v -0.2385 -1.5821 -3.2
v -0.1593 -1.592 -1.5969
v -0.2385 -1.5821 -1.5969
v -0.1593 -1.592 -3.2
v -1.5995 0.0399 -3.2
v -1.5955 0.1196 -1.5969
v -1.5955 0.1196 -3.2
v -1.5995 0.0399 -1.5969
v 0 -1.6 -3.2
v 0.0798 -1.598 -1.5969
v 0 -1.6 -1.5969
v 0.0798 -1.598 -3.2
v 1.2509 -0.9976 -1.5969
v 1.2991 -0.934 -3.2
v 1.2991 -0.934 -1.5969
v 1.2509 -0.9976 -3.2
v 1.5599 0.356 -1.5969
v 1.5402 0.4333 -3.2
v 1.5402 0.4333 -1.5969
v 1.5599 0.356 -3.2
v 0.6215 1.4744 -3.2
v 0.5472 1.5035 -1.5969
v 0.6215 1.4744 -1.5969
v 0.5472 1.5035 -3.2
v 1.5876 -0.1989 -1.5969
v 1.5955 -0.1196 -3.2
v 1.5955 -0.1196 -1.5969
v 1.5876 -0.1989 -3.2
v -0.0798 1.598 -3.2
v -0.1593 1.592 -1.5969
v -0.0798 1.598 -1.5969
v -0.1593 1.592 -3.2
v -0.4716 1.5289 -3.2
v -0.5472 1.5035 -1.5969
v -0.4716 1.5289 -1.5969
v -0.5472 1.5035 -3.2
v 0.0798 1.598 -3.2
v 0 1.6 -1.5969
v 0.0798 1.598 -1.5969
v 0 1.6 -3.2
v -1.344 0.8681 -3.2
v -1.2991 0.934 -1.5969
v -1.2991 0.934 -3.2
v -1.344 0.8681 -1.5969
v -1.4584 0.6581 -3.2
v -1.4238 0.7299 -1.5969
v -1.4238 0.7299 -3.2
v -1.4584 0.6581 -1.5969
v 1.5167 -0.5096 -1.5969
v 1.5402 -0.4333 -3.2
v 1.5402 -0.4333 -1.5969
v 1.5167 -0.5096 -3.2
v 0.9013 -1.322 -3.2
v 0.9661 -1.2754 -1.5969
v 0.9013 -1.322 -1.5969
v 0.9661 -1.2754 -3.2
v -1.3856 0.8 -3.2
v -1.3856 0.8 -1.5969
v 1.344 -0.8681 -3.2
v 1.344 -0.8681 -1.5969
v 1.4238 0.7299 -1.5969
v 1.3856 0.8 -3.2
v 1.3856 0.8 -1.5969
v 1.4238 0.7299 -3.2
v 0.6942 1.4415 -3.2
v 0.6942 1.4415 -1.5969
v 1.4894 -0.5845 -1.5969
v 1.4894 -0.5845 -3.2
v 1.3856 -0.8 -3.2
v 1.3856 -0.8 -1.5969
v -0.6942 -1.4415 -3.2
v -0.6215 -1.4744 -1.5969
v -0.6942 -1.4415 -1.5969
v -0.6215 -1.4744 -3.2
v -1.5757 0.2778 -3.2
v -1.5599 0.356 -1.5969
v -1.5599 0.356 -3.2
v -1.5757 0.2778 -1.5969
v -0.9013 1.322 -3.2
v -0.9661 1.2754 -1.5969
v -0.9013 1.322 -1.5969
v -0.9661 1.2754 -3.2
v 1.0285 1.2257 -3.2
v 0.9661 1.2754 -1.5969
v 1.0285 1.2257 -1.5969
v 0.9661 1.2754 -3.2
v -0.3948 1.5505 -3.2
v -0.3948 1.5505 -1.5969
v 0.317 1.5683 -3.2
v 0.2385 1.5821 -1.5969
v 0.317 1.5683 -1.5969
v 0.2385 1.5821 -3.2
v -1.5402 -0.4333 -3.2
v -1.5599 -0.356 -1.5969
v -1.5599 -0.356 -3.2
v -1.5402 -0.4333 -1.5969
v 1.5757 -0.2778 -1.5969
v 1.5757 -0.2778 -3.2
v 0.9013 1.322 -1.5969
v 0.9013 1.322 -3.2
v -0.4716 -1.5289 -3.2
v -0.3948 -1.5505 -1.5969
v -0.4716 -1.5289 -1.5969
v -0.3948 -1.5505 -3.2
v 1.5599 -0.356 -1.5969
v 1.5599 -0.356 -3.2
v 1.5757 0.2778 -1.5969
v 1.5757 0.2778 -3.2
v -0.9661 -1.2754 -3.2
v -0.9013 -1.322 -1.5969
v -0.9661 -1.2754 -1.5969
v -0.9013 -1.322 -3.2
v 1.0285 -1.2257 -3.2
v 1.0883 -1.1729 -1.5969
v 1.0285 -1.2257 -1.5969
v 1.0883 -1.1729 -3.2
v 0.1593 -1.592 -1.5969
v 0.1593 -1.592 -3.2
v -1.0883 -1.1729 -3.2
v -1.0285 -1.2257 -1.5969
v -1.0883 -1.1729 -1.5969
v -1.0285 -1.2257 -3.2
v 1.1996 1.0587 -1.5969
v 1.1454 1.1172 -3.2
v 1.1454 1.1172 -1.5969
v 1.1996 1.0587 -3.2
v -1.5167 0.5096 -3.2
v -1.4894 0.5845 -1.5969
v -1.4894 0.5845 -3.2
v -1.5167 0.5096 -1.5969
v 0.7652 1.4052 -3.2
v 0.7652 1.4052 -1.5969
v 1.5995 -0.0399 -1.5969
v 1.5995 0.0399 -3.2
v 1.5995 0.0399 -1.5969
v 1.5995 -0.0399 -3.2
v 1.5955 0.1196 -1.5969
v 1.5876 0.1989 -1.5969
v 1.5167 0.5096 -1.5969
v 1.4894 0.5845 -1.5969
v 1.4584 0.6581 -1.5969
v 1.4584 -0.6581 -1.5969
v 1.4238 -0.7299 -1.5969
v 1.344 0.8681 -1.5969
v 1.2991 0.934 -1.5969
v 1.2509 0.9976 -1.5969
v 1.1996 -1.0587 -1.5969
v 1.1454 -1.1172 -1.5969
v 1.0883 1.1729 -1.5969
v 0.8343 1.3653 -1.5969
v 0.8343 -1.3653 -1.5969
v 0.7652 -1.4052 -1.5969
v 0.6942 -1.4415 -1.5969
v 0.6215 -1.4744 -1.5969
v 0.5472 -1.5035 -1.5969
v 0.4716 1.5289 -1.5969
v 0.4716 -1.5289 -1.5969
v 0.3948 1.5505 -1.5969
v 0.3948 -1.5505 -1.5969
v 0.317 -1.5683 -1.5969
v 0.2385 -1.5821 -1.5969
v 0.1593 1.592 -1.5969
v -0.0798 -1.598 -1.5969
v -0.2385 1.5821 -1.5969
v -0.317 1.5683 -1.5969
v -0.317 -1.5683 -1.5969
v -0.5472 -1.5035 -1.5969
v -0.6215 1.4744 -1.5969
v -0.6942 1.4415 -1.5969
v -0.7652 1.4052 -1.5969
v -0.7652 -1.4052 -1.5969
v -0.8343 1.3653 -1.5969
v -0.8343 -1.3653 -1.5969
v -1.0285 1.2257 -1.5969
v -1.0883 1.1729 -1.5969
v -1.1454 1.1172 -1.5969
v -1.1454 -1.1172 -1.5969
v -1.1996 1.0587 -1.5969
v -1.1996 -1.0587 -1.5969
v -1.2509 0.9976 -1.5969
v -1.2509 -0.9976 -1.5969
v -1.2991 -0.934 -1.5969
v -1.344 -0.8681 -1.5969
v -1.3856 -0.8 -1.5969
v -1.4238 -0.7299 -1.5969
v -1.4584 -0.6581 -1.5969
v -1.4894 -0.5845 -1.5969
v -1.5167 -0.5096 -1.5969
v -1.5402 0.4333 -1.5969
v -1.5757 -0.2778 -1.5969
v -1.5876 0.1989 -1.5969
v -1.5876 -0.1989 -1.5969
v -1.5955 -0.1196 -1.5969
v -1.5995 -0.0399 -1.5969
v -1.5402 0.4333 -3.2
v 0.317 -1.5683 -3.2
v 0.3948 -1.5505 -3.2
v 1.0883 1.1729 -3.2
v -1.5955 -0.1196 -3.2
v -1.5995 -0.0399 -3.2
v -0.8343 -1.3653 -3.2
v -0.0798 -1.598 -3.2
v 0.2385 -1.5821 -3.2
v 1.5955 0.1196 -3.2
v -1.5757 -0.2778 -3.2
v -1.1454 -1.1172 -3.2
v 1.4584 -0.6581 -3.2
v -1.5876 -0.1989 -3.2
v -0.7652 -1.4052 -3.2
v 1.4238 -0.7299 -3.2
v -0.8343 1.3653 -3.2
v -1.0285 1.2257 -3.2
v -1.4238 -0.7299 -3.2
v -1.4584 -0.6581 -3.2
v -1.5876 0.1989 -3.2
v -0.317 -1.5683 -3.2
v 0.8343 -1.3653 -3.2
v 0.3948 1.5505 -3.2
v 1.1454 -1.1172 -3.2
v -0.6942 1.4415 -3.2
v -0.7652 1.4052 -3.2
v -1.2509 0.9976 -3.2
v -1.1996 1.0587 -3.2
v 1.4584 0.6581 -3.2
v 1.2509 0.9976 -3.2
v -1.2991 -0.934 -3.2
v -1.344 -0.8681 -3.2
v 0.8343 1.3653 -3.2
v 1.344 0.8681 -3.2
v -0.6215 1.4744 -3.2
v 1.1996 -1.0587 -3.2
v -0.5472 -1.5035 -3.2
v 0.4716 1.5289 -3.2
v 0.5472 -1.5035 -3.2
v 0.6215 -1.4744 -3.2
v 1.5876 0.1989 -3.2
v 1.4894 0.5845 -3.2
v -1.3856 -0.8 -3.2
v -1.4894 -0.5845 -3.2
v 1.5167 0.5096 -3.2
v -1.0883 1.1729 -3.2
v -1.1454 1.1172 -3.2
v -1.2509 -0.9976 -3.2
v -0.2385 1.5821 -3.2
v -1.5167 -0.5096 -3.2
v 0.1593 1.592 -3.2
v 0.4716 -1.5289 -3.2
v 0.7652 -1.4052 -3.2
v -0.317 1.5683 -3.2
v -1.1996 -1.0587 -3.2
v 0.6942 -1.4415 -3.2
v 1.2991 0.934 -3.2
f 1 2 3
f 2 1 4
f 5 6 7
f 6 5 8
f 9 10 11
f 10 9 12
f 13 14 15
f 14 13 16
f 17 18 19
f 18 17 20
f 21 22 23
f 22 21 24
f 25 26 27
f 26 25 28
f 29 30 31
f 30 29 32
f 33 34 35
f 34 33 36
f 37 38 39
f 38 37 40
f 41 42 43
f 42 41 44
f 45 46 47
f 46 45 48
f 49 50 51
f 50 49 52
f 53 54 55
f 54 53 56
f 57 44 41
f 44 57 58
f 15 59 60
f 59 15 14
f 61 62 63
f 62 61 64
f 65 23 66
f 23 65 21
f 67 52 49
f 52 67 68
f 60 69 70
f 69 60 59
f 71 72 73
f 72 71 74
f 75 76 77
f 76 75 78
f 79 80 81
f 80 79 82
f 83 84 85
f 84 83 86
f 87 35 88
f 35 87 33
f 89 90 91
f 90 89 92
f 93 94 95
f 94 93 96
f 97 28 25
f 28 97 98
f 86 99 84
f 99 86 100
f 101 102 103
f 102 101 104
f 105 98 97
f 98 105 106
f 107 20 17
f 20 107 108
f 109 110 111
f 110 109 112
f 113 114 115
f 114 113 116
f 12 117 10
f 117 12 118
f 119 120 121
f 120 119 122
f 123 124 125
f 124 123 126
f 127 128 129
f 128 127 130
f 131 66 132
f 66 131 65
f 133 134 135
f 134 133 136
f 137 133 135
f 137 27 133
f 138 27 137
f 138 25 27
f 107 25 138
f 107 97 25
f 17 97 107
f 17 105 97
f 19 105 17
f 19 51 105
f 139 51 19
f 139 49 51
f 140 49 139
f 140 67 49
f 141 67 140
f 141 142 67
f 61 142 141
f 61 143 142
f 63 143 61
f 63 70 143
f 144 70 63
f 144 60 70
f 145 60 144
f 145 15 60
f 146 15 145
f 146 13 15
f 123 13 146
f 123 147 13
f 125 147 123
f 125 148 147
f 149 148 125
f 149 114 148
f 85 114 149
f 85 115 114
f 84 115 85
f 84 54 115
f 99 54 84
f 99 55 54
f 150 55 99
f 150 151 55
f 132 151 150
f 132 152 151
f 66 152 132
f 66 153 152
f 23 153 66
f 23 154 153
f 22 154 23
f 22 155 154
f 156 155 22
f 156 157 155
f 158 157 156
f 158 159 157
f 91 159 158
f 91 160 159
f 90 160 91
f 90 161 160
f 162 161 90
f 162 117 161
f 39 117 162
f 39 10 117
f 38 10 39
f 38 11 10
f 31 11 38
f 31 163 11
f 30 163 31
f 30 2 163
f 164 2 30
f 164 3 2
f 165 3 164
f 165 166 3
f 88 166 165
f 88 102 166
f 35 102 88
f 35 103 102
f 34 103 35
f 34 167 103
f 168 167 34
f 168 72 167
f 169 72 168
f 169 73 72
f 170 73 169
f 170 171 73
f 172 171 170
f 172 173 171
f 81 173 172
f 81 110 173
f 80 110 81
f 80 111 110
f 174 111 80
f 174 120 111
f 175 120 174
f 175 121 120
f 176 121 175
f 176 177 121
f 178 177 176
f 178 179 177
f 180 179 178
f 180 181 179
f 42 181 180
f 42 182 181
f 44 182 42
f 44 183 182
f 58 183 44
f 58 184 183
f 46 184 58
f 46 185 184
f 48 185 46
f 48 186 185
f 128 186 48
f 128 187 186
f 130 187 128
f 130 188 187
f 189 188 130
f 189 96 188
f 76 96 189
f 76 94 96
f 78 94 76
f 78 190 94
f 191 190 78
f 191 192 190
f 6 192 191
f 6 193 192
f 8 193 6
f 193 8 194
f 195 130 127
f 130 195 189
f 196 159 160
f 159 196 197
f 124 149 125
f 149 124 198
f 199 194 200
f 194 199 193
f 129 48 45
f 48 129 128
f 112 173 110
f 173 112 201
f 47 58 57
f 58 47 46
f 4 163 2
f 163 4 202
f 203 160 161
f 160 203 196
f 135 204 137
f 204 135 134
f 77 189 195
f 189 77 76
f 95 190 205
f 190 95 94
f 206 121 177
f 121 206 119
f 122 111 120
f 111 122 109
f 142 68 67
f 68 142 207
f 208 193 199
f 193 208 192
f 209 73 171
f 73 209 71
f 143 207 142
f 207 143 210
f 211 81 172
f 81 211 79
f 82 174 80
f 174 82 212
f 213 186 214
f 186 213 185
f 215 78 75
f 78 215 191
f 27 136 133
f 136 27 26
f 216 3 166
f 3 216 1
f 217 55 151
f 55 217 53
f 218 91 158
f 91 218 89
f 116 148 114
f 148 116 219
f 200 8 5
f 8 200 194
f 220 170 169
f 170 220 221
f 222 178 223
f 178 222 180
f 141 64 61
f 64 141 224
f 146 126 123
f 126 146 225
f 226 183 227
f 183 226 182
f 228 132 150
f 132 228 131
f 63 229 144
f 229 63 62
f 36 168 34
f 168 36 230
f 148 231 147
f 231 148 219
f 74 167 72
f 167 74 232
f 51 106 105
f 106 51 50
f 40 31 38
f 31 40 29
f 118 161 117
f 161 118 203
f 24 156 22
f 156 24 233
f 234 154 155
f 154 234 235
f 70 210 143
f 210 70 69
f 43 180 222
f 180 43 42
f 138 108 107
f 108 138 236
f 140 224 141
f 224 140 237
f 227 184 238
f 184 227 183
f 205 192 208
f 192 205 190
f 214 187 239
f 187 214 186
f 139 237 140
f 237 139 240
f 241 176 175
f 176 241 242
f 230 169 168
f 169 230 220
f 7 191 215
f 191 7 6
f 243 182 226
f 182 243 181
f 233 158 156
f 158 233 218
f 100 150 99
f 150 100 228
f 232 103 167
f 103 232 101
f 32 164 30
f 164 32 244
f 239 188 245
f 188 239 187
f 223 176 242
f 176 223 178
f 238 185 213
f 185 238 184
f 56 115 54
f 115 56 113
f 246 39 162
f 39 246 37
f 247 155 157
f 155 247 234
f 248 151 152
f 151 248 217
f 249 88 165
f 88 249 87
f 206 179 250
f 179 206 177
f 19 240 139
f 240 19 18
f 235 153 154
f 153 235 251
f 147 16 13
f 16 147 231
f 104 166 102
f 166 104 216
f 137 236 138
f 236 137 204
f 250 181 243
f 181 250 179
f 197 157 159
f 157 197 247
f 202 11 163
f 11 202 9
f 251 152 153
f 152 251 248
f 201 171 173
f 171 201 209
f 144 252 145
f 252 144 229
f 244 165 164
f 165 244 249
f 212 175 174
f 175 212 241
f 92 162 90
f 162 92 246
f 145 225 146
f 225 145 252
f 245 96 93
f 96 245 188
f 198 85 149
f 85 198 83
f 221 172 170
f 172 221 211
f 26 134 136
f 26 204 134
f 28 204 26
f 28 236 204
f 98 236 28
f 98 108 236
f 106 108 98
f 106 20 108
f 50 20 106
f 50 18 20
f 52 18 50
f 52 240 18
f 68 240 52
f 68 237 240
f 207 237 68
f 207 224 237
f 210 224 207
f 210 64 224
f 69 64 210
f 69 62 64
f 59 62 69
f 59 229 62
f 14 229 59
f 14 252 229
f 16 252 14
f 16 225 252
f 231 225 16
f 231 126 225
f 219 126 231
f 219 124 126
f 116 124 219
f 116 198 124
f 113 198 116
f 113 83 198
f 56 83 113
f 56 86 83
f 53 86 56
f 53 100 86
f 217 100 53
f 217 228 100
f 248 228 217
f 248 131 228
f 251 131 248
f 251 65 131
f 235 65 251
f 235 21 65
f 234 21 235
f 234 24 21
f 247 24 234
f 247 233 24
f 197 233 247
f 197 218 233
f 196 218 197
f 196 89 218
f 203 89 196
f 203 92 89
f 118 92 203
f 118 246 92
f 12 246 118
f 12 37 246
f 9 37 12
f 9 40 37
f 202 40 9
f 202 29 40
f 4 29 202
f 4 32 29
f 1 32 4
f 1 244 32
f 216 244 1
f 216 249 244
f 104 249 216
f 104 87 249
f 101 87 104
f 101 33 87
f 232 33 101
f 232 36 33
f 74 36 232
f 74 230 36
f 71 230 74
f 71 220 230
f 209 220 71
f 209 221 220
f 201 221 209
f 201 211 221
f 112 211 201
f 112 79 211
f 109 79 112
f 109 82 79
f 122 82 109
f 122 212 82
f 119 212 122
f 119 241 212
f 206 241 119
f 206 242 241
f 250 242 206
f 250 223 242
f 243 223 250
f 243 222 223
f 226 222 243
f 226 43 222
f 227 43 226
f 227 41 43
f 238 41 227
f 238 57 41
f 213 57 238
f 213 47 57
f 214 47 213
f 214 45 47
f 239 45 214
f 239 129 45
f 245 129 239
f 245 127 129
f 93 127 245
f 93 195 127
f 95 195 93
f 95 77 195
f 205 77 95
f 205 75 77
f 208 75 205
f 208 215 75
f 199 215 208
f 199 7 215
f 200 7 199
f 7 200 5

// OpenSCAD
// file: ../../p/stud.scad
use <../lib.scad>
use <4-4cyli.scad>
use <4-4disc.scad>
use <4-4edge.scad>
$fa=1; $fs=0.2;
function ldraw_lib__stud(realsolid=false) = realsolid ? 
    [openscad(translate([0,0,-eps()], o=cylinder(4+eps(), r=6)),2)] : [
// 0 Stud
// 0 Name: stud.dat
// 0 Author: James Jessiman
// 0 !LDRAW_ORG Primitive UPDATE 2012-01
// 0 !LICENSE Licensed under CC BY 2.0 and CC BY 4.0 : see CAreadme.txt
// 
// 0 BFC CERTIFY CCW
  [0,"BFC","CERTIFY"],
  [0,"BFC","CCW"],
// 
// 0 !HISTORY 2002-04-04 [sbliss] Modified for BFC compliance
// 0 !HISTORY 2002-04-25 [PTadmin] Official Update 2002-02
// 0 !HISTORY 2007-06-24 [PTadmin] Header formatted for Contributor Agreement
// 0 !HISTORY 2008-07-01 [PTadmin] Official Update 2008-01
// 0 !HISTORY 2012-02-16 [Philo] Changed to CCW
// 0 !HISTORY 2012-03-30 [PTadmin] Official Update 2012-01
// 
// 
// 1 16 0 0 0 6 0 0 0 1 0 0 0 6 4-4edge.dat
  [1,16,0,0,0,6,0,0,0,1,0,0,0,6, ldraw_lib__4_4edge(realsolid)],
// 1 16 0 -4 0 6 0 0 0 1 0 0 0 6 4-4edge.dat
  [1,16,0,-4,0,6,0,0,0,1,0,0,0,6, ldraw_lib__4_4edge(realsolid)],
// 1 16 0 0 0 6 0 0 0 -4 0 0 0 6 4-4cyli.dat
  [1,16,0,0,0,6,0,0,0,-4,0,0,0,6, ldraw_lib__4_4cyli(realsolid)],
// 1 16 0 -4 0 6 0 0 0 1 0 0 0 6 4-4disc.dat
  [1,16,0,-4,0,6,0,0,0,1,0,0,0,6, ldraw_lib__4_4disc(realsolid)],
];
module ldraw_lib__stud(step=0, col=false, unit=2/5, alt=false, line=0.2, solid=!$preview)
    makepoly(ldraw_lib__stud(solid), step=step, col=col, unit=unit, alt=alt, line=line, solid=solid);
ldraw_lib__stud(line=0.2);
// file: ../../p/box5.scad
use <../lib.scad>
$fa=1; $fs=0.2;
function ldraw_lib__box5(realsolid=false) = [
// 0 Box with 5 Faces and All Edges
// 0 Name: box5.dat
// 0 Author: James Jessiman
// 0 !LDRAW_ORG Primitive UPDATE 2012-01
// 0 !LICENSE Licensed under CC BY 2.0 and CC BY 4.0 : see CAreadme.txt
// 
// 0 BFC CERTIFY CCW
  [0,"BFC","CERTIFY"],
  [0,"BFC","CCW"],
// 
// 0 !HISTORY 2002-04-03 [sbliss] Modified for BFC compliance
// 0 !HISTORY 2002-04-25 [PTadmin] Official Update 2002-02
// 0 !HISTORY 2007-06-24 [PTadmin] Header formatted for Contributor Agreement
// 0 !HISTORY 2008-07-01 [PTadmin] Official Update 2008-01
// 0 !HISTORY 2012-02-16 [Philo] Changed to CCW
// 0 !HISTORY 2012-03-30 [PTadmin] Official Update 2012-01
// 
// 
// 2 24 1 1 1 -1 1 1
  [2,24,1,1,1,-1,1,1],
// 2 24 -1 1 1 -1 1 -1
  [2,24,-1,1,1,-1,1,-1],
// 2 24 -1 1 -1 1 1 -1
  [2,24,-1,1,-1,1,1,-1],
// 2 24 1 1 -1 1 1 1
  [2,24,1,1,-1,1,1,1],
// 2 24 1 0 1 -1 0 1
  [2,24,1,0,1,-1,0,1],
// 2 24 -1 0 1 -1 0 -1
  [2,24,-1,0,1,-1,0,-1],
// 2 24 -1 0 -1 1 0 -1
  [2,24,-1,0,-1,1,0,-1],
// 2 24 1 0 -1 1 0 1
  [2,24,1,0,-1,1,0,1],
// 2 24 1 0 1 1 1 1
  [2,24,1,0,1,1,1,1],
// 2 24 -1 0 1 -1 1 1
  [2,24,-1,0,1,-1,1,1],
// 2 24 1 0 -1 1 1 -1
  [2,24,1,0,-1,1,1,-1],
// 2 24 -1 0 -1 -1 1 -1
  [2,24,-1,0,-1,-1,1,-1],
// 4 16 -1 1 1 1 1 1 1 1 -1 -1 1 -1
  [4,16,-1,1,1,1,1,1,1,1,-1,-1,1,-1],
// 4 16 -1 1 1 -1 0 1 1 0 1 1 1 1
  [4,16,-1,1,1,-1,0,1,1,0,1,1,1,1],
// 4 16 -1 1 -1 -1 0 -1 -1 0 1 -1 1 1
  [4,16,-1,1,-1,-1,0,-1,-1,0,1,-1,1,1],
// 4 16 1 1 -1 1 0 -1 -1 0 -1 -1 1 -1
  [4,16,1,1,-1,1,0,-1,-1,0,-1,-1,1,-1],
// 4 16 1 1 1 1 0 1 1 0 -1 1 1 -1
  [4,16,1,1,1,1,0,1,1,0,-1,1,1,-1],
];
module ldraw_lib__box5(step=0, col=false, unit=2/5, alt=false, line=0.2, solid=!$preview)
    makepoly(ldraw_lib__box5(solid), step=step, col=col, unit=unit, alt=alt, line=line, solid=solid);
ldraw_lib__box5(line=0.2);
// file: ../../p/box4t.scad
use <../lib.scad>
$fa=1; $fs=0.2;
function ldraw_lib__box4t(realsolid=false) = [
// 0 Box with 4 Adjacent Faces and All Edges
// 0 Name: box4t.dat
// 0 Author: Tore Eriksson [Tore_Eriksson]
// 0 !LDRAW_ORG Primitive UPDATE 2003-02
// 0 !LICENSE Licensed under CC BY 2.0 and CC BY 4.0 : see CAreadme.txt
// 
// 0 BFC CERTIFY CCW
  [0,"BFC","CERTIFY"],
  [0,"BFC","CCW"],
// 
// 0 !HISTORY 1997-09-29 [PTadmin] Official Update 1997-15
// 0 !HISTORY 2002-08-31 [izanette] Modified with WINDZ for BFC compliance
// 0 !HISTORY 2003-08-01 [PTadmin] Official Update 2003-02
// 0 !HISTORY 2007-06-24 [PTadmin] Header formatted for Contributor Agreement
// 0 !HISTORY 2008-07-01 [PTadmin] Official Update 2008-01
// 
// 
// 2 24 1 1 1 -1 1 1
  [2,24,1,1,1,-1,1,1],
// 2 24 -1 1 1 -1 1 -1
  [2,24,-1,1,1,-1,1,-1],
// 2 24 -1 1 -1 1 1 -1
  [2,24,-1,1,-1,1,1,-1],
// 2 24 1 1 -1 1 1 1
  [2,24,1,1,-1,1,1,1],
// 2 24 1 0 1 -1 0 1
  [2,24,1,0,1,-1,0,1],
// 2 24 -1 0 1 -1 0 -1
  [2,24,-1,0,1,-1,0,-1],
// 2 24 -1 0 -1 1 0 -1
  [2,24,-1,0,-1,1,0,-1],
// 2 24 1 0 -1 1 0 1
  [2,24,1,0,-1,1,0,1],
// 2 24 1 0 1 1 1 1
  [2,24,1,0,1,1,1,1],
// 2 24 -1 0 1 -1 1 1
  [2,24,-1,0,1,-1,1,1],
// 2 24 1 0 -1 1 1 -1
  [2,24,1,0,-1,1,1,-1],
// 2 24 -1 0 -1 -1 1 -1
  [2,24,-1,0,-1,-1,1,-1],
// 4 16 1 1 1 1 1 -1 -1 1 -1 -1 1 1
  [4,16,1,1,1,1,1,-1,-1,1,-1,-1,1,1],
// 4 16 1 1 1 -1 1 1 -1 0 1 1 0 1
  [4,16,1,1,1,-1,1,1,-1,0,1,1,0,1],
// 4 16 -1 1 1 -1 1 -1 -1 0 -1 -1 0 1
  [4,16,-1,1,1,-1,1,-1,-1,0,-1,-1,0,1],
// 0 4 16 -1 1 -1 -1 0 -1 1 0 -1 1 1 -1
// 4 16 1 1 -1 1 1 1 1 0 1 1 0 -1
  [4,16,1,1,-1,1,1,1,1,0,1,1,0,-1],
// 0
];
module ldraw_lib__box4t(step=0, col=false, unit=2/5, alt=false, line=0.2, solid=!$preview)
    makepoly(ldraw_lib__box4t(solid), step=step, col=col, unit=unit, alt=alt, line=line, solid=solid);
ldraw_lib__box4t(line=0.2);
// file: 3004s01.scad
use <../../lib.scad>
use <../../p/box4t.scad>
use <../../p/box5.scad>
use <../../p/stud.scad>
use <../../p/stud3.scad>
$fa=1; $fs=0.2;
function ldraw_lib__s__3004s01(realsolid=false) = [
// 0 ~Brick  1 x  2 without Front Face
// 0 Name: s\3004s01.dat
// 0 Author: James Jessiman
// 0 !LDRAW_ORG Subpart UPDATE 2003-03
// 0 !LICENSE Licensed under CC BY 2.0 and CC BY 4.0 : see CAreadme.txt
// 
// 0 BFC CERTIFY CCW
  [0,"BFC","CERTIFY"],
  [0,"BFC","CCW"],
// 
// 0 !HISTORY 2003-09-07 [jriley] Subfiling, BFC
// 0 !HISTORY 2003-12-19 [PTadmin] Official Update 2003-03
// 0 !HISTORY 2007-08-29 [PTadmin] Header formatted for Contributor Agreement
// 0 !HISTORY 2008-07-01 [PTadmin] Official Update 2008-01
// 
// 
// 1 16 0 4 0 1 0 0 0 -5 0 0 0 1 stud3.dat
  [1,16,0,4,0,1,0,0,0,-5,0,0,0,1, ldraw_lib__stud3(realsolid)],
// 0 BFC INVERTNEXT
  [0,"BFC","INVERTNEXT"],
// 1 16 0 24 0 16 0 0 0 -20 0 0 0 6 box5.dat
  [1,16,0,24,0,16,0,0,0,-20,0,0,0,6, ldraw_lib__box5(realsolid)],
// 4 16 20 24 10 16 24 6 -16 24 6 -20 24 10
  [4,16,20,24,10,16,24,6,-16,24,6,-20,24,10],
// 4 16 -20 24 10 -16 24 6 -16 24 -6 -20 24 -10
  [4,16,-20,24,10,-16,24,6,-16,24,-6,-20,24,-10],
// 4 16 -20 24 -10 -16 24 -6 16 24 -6 20 24 -10
  [4,16,-20,24,-10,-16,24,-6,16,24,-6,20,24,-10],
// 4 16 20 24 -10 16 24 -6 16 24 6 20 24 10
  [4,16,20,24,-10,16,24,-6,16,24,6,20,24,10],
// 1 16 0 24 0 20 0 0 0 -24 0 0 0 10 box4t.dat
  [1,16,0,24,0,20,0,0,0,-24,0,0,0,10, ldraw_lib__box4t(realsolid)],
// 1 16 10 0 0 1 0 0 0 1 0 0 0 1 stud.dat
  [1,16,10,0,0,1,0,0,0,1,0,0,0,1, ldraw_lib__stud(realsolid)],
// 1 16 -10 0 0 1 0 0 0 1 0 0 0 1 stud.dat
  [1,16,-10,0,0,1,0,0,0,1,0,0,0,1, ldraw_lib__stud(realsolid)],
// 0
];
module ldraw_lib__s__3004s01(step=0, col=false, unit=2/5, alt=false, line=0.2, solid=!$preview)
    makepoly(ldraw_lib__s__3004s01(solid), step=step, col=col, unit=unit, alt=alt, line=line, solid=solid);
ldraw_lib__s__3004s01(line=0.2);
// file: ../../p/4-4edge.scad
use <../lib.scad>
$fa=1; $fs=0.2;
function ldraw_lib__4_4edge(realsolid=false) = [
// 0 Circle 1.0
// 0 Name: 4-4edge.dat
// 0 Author: James Jessiman
// 0 !LDRAW_ORG Primitive UPDATE 2017-01
// 0 !LICENSE Licensed under CC BY 2.0 and CC BY 4.0 : see CAreadme.txt
// 
// 0 BFC CERTIFY CCW
  [0,"BFC","CERTIFY"],
  [0,"BFC","CCW"],
// 
// 0 !HISTORY 1998-12-15 [PTadmin] Official Update 1998-10
// 0 !HISTORY 2005-12-28 [PTadmin] Official Update 2005-01
// 0 !HISTORY 2007-06-24 [PTadmin] Header formatted for Contributor Agreement
// 0 !HISTORY 2008-07-01 [PTadmin] Official Update 2008-01
// 0 !HISTORY 2017-01-15 [Steffen] BFCed
// 0 !HISTORY 2017-12-30 [PTadmin] Official Update 2017-01
// 
// 
// 2 24 1 0 0 0.9239 0 0.3827
  [2,24,1,0,0,0.9239,0,0.3827],
// 2 24 0.9239 0 0.3827 0.7071 0 0.7071
  [2,24,0.9239,0,0.3827,0.7071,0,0.7071],
// 2 24 0.7071 0 0.7071 0.3827 0 0.9239
  [2,24,0.7071,0,0.7071,0.3827,0,0.9239],
// 2 24 0.3827 0 0.9239 0 0 1
  [2,24,0.3827,0,0.9239,0,0,1],
// 2 24 0 0 1 -0.3827 0 0.9239
  [2,24,0,0,1,-0.3827,0,0.9239],
// 2 24 -0.3827 0 0.9239 -0.7071 0 0.7071
  [2,24,-0.3827,0,0.9239,-0.7071,0,0.7071],
// 2 24 -0.7071 0 0.7071 -0.9239 0 0.3827
  [2,24,-0.7071,0,0.7071,-0.9239,0,0.3827],
// 2 24 -0.9239 0 0.3827 -1 0 -0
  [2,24,-0.9239,0,0.3827,-1,0,-0],
// 2 24 -1 0 -0 -0.9239 0 -0.3827
  [2,24,-1,0,-0,-0.9239,0,-0.3827],
// 2 24 -0.9239 0 -0.3827 -0.7071 0 -0.7071
  [2,24,-0.9239,0,-0.3827,-0.7071,0,-0.7071],
// 2 24 -0.7071 0 -0.7071 -0.3827 0 -0.9239
  [2,24,-0.7071,0,-0.7071,-0.3827,0,-0.9239],
// 2 24 -0.3827 0 -0.9239 0 0 -1
  [2,24,-0.3827,0,-0.9239,0,0,-1],
// 2 24 0 0 -1 0.3827 0 -0.9239
  [2,24,0,0,-1,0.3827,0,-0.9239],
// 2 24 0.3827 0 -0.9239 0.7071 0 -0.7071
  [2,24,0.3827,0,-0.9239,0.7071,0,-0.7071],
// 2 24 0.7071 0 -0.7071 0.9239 0 -0.3827
  [2,24,0.7071,0,-0.7071,0.9239,0,-0.3827],
// 2 24 0.9239 0 -0.3827 1 0 0
  [2,24,0.9239,0,-0.3827,1,0,0],
];
module ldraw_lib__4_4edge(step=0, col=false, unit=2/5, alt=false, line=0.2, solid=!$preview)
    makepoly(ldraw_lib__4_4edge(solid), step=step, col=col, unit=unit, alt=alt, line=line, solid=solid);
ldraw_lib__4_4edge(line=0.2);
// file: ../../p/4-4disc.scad
use <../lib.scad>
$fa=1; $fs=0.2;
function ldraw_lib__4_4disc(realsolid=false) = [
// 0 Disc 1.0
// 0 Name: 4-4disc.dat
// 0 Author: James Jessiman
// 0 !LDRAW_ORG Primitive UPDATE 2002-02
// 0 !LICENSE Licensed under CC BY 2.0 and CC BY 4.0 : see CAreadme.txt
// 
// 0 BFC CERTIFY CCW
  [0,"BFC","CERTIFY"],
  [0,"BFC","CCW"],
// 
// 0 !HISTORY 1998-12-15 [PTadmin] Official Update 1998-10
// 0 !HISTORY 2002-03-23 [sbliss] Added BFC statement
// 0 !HISTORY 2002-04-25 [PTadmin] Official Update 2002-02
// 0 !HISTORY 2007-06-24 [PTadmin] Header formatted for Contributor Agreement
// 0 !HISTORY 2008-07-01 [PTadmin] Official Update 2008-01
// 
// 
// 3 16 0 0 0 1 0 0 0.9239 0 0.3827
  [3,16,0,0,0,1,0,0,0.9239,0,0.3827],
// 3 16 0 0 0 0.9239 0 0.3827 0.7071 0 0.7071
  [3,16,0,0,0,0.9239,0,0.3827,0.7071,0,0.7071],
// 3 16 0 0 0 0.7071 0 0.7071 0.3827 0 0.9239
  [3,16,0,0,0,0.7071,0,0.7071,0.3827,0,0.9239],
// 3 16 0 0 0 0.3827 0 0.9239 0 0 1
  [3,16,0,0,0,0.3827,0,0.9239,0,0,1],
// 3 16 0 0 0 0 0 1 -0.3827 0 0.9239
  [3,16,0,0,0,0,0,1,-0.3827,0,0.9239],
// 3 16 0 0 0 -0.3827 0 0.9239 -0.7071 0 0.7071
  [3,16,0,0,0,-0.3827,0,0.9239,-0.7071,0,0.7071],
// 3 16 0 0 0 -0.7071 0 0.7071 -0.9239 0 0.3827
  [3,16,0,0,0,-0.7071,0,0.7071,-0.9239,0,0.3827],
// 3 16 0 0 0 -0.9239 0 0.3827 -1 0 -0
  [3,16,0,0,0,-0.9239,0,0.3827,-1,0,-0],
// 3 16 0 0 0 -1 0 -0 -0.9239 0 -0.3827
  [3,16,0,0,0,-1,0,-0,-0.9239,0,-0.3827],
// 3 16 0 0 0 -0.9239 0 -0.3827 -0.7071 0 -0.7071
  [3,16,0,0,0,-0.9239,0,-0.3827,-0.7071,0,-0.7071],
// 3 16 0 0 0 -0.7071 0 -0.7071 -0.3827 0 -0.9239
  [3,16,0,0,0,-0.7071,0,-0.7071,-0.3827,0,-0.9239],
// 3 16 0 0 0 -0.3827 0 -0.9239 0 0 -1
  [3,16,0,0,0,-0.3827,0,-0.9239,0,0,-1],
// 3 16 0 0 0 0 0 -1 0.3827 0 -0.9239
  [3,16,0,0,0,0,0,-1,0.3827,0,-0.9239],
// 3 16 0 0 0 0.3827 0 -0.9239 0.7071 0 -0.7071
  [3,16,0,0,0,0.3827,0,-0.9239,0.7071,0,-0.7071],
// 3 16 0 0 0 0.7071 0 -0.7071 0.9239 0 -0.3827
  [3,16,0,0,0,0.7071,0,-0.7071,0.9239,0,-0.3827],
// 3 16 0 0 0 0.9239 0 -0.3827 1 0 0
  [3,16,0,0,0,0.9239,0,-0.3827,1,0,0],
// 0
];
module ldraw_lib__4_4disc(step=0, col=false, unit=2/5, alt=false, line=0.2, solid=!$preview)
    makepoly(ldraw_lib__4_4disc(solid), step=step, col=col, unit=unit, alt=alt, line=line, solid=solid);
ldraw_lib__4_4disc(line=0.2);
// file: ../../p/4-4cyli.scad
use <../lib.scad>
$fa=1; $fs=0.2;
function ldraw_lib__4_4cyli(realsolid=false) = [
// 0 Cylinder 1.0
// 0 Name: 4-4cyli.dat
// 0 Author: James Jessiman
// 0 !LDRAW_ORG Primitive UPDATE 2005-01
// 0 !LICENSE Licensed under CC BY 2.0 and CC BY 4.0 : see CAreadme.txt
// 
// 0 BFC CERTIFY CCW
  [0,"BFC","CERTIFY"],
  [0,"BFC","CCW"],
// 
// 0 !HISTORY 1998-12-15 [PTadmin] Official Update 1998-10
// 0 !HISTORY 2002-03-23 [sbliss] Added BFC statement; merged headers from files in distributions LDraw 0.27 and Complete.
// 0 !HISTORY 2002-04-25 [PTadmin] Official Update 2002-02
// 0 !HISTORY 2004-12-14 [guyvivan] BFC CCW
// 0 !HISTORY 2005-12-28 [PTadmin] Official Update 2005-01
// 0 !HISTORY 2007-06-24 [PTadmin] Header formatted for Contributor Agreement
// 0 !HISTORY 2008-07-01 [PTadmin] Official Update 2008-01
// 
// 
// 4 16 1 1 0 0.9239 1 0.3827 0.9239 0 0.3827 1 0 0
  [4,16,1,1,0,0.9239,1,0.3827,0.9239,0,0.3827,1,0,0],
// 5 24 1 0 0 1 1 0 0.9239 0 0.3827 0.9239 0 -0.3827
  [5,24,1,0,0,1,1,0,0.9239,0,0.3827,0.9239,0,-0.3827],
// 4 16 0.9239 1 0.3827 0.7071 1 0.7071 0.7071 0 0.7071 0.9239 0 0.3827
  [4,16,0.9239,1,0.3827,0.7071,1,0.7071,0.7071,0,0.7071,0.9239,0,0.3827],
// 5 24 0.9239 0 0.3827 0.9239 1 0.3827 0.7071 0 0.7071 1 0 0
  [5,24,0.9239,0,0.3827,0.9239,1,0.3827,0.7071,0,0.7071,1,0,0],
// 4 16 0.7071 1 0.7071 0.3827 1 0.9239 0.3827 0 0.9239 0.7071 0 0.7071
  [4,16,0.7071,1,0.7071,0.3827,1,0.9239,0.3827,0,0.9239,0.7071,0,0.7071],
// 5 24 0.7071 0 0.7071 0.7071 1 0.7071 0.3827 0 0.9239 0.9239 0 0.3827
  [5,24,0.7071,0,0.7071,0.7071,1,0.7071,0.3827,0,0.9239,0.9239,0,0.3827],
// 4 16 0.3827 1 0.9239 0 1 1 0 0 1 0.3827 0 0.9239
  [4,16,0.3827,1,0.9239,0,1,1,0,0,1,0.3827,0,0.9239],
// 5 24 0.3827 0 0.9239 0.3827 1 0.9239 0 0 1 0.7071 0 0.7071
  [5,24,0.3827,0,0.9239,0.3827,1,0.9239,0,0,1,0.7071,0,0.7071],
// 4 16 0 1 1 -0.3827 1 0.9239 -0.3827 0 0.9239 0 0 1
  [4,16,0,1,1,-0.3827,1,0.9239,-0.3827,0,0.9239,0,0,1],
// 5 24 0 0 1 0 1 1 -0.3827 0 0.9239 0.3827 0 0.9239
  [5,24,0,0,1,0,1,1,-0.3827,0,0.9239,0.3827,0,0.9239],
// 4 16 -0.3827 1 0.9239 -0.7071 1 0.7071 -0.7071 0 0.7071 -0.3827 0 0.9239
  [4,16,-0.3827,1,0.9239,-0.7071,1,0.7071,-0.7071,0,0.7071,-0.3827,0,0.9239],
// 5 24 -0.3827 0 0.9239 -0.3827 1 0.9239 -0.7071 0 0.7071 0 0 1
  [5,24,-0.3827,0,0.9239,-0.3827,1,0.9239,-0.7071,0,0.7071,0,0,1],
// 4 16 -0.7071 1 0.7071 -0.9239 1 0.3827 -0.9239 0 0.3827 -0.7071 0 0.7071
  [4,16,-0.7071,1,0.7071,-0.9239,1,0.3827,-0.9239,0,0.3827,-0.7071,0,0.7071],
// 5 24 -0.7071 0 0.7071 -0.7071 1 0.7071 -0.9239 0 0.3827 -0.3827 0 0.9239
  [5,24,-0.7071,0,0.7071,-0.7071,1,0.7071,-0.9239,0,0.3827,-0.3827,0,0.9239],
// 4 16 -0.9239 1 0.3827 -1 1 0 -1 0 0 -0.9239 0 0.3827
  [4,16,-0.9239,1,0.3827,-1,1,0,-1,0,0,-0.9239,0,0.3827],
// 5 24 -0.9239 0 0.3827 -0.9239 1 0.3827 -1 0 0 -0.7071 0 0.7071
  [5,24,-0.9239,0,0.3827,-0.9239,1,0.3827,-1,0,0,-0.7071,0,0.7071],
// 4 16 -1 1 0 -0.9239 1 -0.3827 -0.9239 0 -0.3827 -1 0 0
  [4,16,-1,1,0,-0.9239,1,-0.3827,-0.9239,0,-0.3827,-1,0,0],
// 5 24 -1 0 0 -1 1 0 -0.9239 0 -0.3827 -0.9239 0 0.3827
  [5,24,-1,0,0,-1,1,0,-0.9239,0,-0.3827,-0.9239,0,0.3827],
// 4 16 -0.9239 1 -0.3827 -0.7071 1 -0.7071 -0.7071 0 -0.7071 -0.9239 0 -0.3827
  [4,16,-0.9239,1,-0.3827,-0.7071,1,-0.7071,-0.7071,0,-0.7071,-0.9239,0,-0.3827],
// 5 24 -0.9239 0 -0.3827 -0.9239 1 -0.3827 -0.7071 0 -0.7071 -1 0 0
  [5,24,-0.9239,0,-0.3827,-0.9239,1,-0.3827,-0.7071,0,-0.7071,-1,0,0],
// 4 16 -0.7071 1 -0.7071 -0.3827 1 -0.9239 -0.3827 0 -0.9239 -0.7071 0 -0.7071
  [4,16,-0.7071,1,-0.7071,-0.3827,1,-0.9239,-0.3827,0,-0.9239,-0.7071,0,-0.7071],
// 5 24 -0.7071 0 -0.7071 -0.7071 1 -0.7071 -0.3827 0 -0.9239 -0.9239 0 -0.3827
  [5,24,-0.7071,0,-0.7071,-0.7071,1,-0.7071,-0.3827,0,-0.9239,-0.9239,0,-0.3827],
// 4 16 -0.3827 1 -0.9239 0 1 -1 0 0 -1 -0.3827 0 -0.9239
  [4,16,-0.3827,1,-0.9239,0,1,-1,0,0,-1,-0.3827,0,-0.9239],
// 5 24 -0.3827 0 -0.9239 -0.3827 1 -0.9239 0 0 -1 -0.7071 0 -0.7071
  [5,24,-0.3827,0,-0.9239,-0.3827,1,-0.9239,0,0,-1,-0.7071,0,-0.7071],
// 4 16 0 1 -1 0.3827 1 -0.9239 0.3827 0 -0.9239 0 0 -1
  [4,16,0,1,-1,0.3827,1,-0.9239,0.3827,0,-0.9239,0,0,-1],
// 5 24 0 0 -1 0 1 -1 0.3827 0 -0.9239 -0.3827 0 -0.9239
  [5,24,0,0,-1,0,1,-1,0.3827,0,-0.9239,-0.3827,0,-0.9239],
// 4 16 0.3827 1 -0.9239 0.7071 1 -0.7071 0.7071 0 -0.7071 0.3827 0 -0.9239
  [4,16,0.3827,1,-0.9239,0.7071,1,-0.7071,0.7071,0,-0.7071,0.3827,0,-0.9239],
// 5 24 0.3827 0 -0.9239 0.3827 1 -0.9239 0.7071 0 -0.7071 0 0 -1
  [5,24,0.3827,0,-0.9239,0.3827,1,-0.9239,0.7071,0,-0.7071,0,0,-1],
// 4 16 0.7071 1 -0.7071 0.9239 1 -0.3827 0.9239 0 -0.3827 0.7071 0 -0.7071
  [4,16,0.7071,1,-0.7071,0.9239,1,-0.3827,0.9239,0,-0.3827,0.7071,0,-0.7071],
// 5 24 0.7071 0 -0.7071 0.7071 1 -0.7071 0.9239 0 -0.3827 0.3827 0 -0.9239
  [5,24,0.7071,0,-0.7071,0.7071,1,-0.7071,0.9239,0,-0.3827,0.3827,0,-0.9239],
// 4 16 0.9239 1 -0.3827 1 1 0 1 0 0 0.9239 0 -0.3827
  [4,16,0.9239,1,-0.3827,1,1,0,1,0,0,0.9239,0,-0.3827],
// 5 24 0.9239 0 -0.3827 0.9239 1 -0.3827 1 0 0 0.7071 0 -0.7071
  [5,24,0.9239,0,-0.3827,0.9239,1,-0.3827,1,0,0,0.7071,0,-0.7071],
// 0
];
module ldraw_lib__4_4cyli(step=0, col=false, unit=2/5, alt=false, line=0.2, solid=!$preview)
    makepoly(ldraw_lib__4_4cyli(solid), step=step, col=col, unit=unit, alt=alt, line=line, solid=solid);
ldraw_lib__4_4cyli(line=0.2);
// file: ../3004.scad
use <../lib.scad>
use <s/3004s01.scad>
$fa=1; $fs=0.2;
function ldraw_lib__3004(realsolid=false) = [
// 0 Brick  1 x  2
// 0 Name: 3004.dat
// 0 Author: James Jessiman
// 0 !LDRAW_ORG Part UPDATE 2022-05
// 0 !LICENSE Licensed under CC BY 2.0 and CC BY 4.0 : see CAreadme.txt
// 
// 0 BFC CERTIFY CCW
  [0,"BFC","CERTIFY"],
  [0,"BFC","CCW"],
// 
// 0 !HISTORY 2001-10-26 [PTadmin] Official Update 2001-01
// 0 !HISTORY 2002-05-07 {unknown} BFC Certification
// 0 !HISTORY 2002-06-11 [PTadmin] Official Update 2002-03
// 0 !HISTORY 2007-05-07 [PTadmin] Header formatted for Contributor Agreement
// 0 !HISTORY 2008-07-01 [PTadmin] Official Update 2008-01
// 0 !HISTORY 2022-08-04 [MagFors] Using subfile
// 0 !HISTORY 2022-09-15 [PTadmin] Official Update 2022-05
// 
// 
// 1 16 0 0 0 1 0 0 0 1 0 0 0 1 s\3004s01.dat
  [1,16,0,0,0,1,0,0,0,1,0,0,0,1, ldraw_lib__s__3004s01(realsolid)],
// 4 16 -20 24 -10 20 24 -10 20 0 -10 -20 0 -10
  [4,16,-20,24,-10,20,24,-10,20,0,-10,-20,0,-10],
];
module ldraw_lib__3004(step=0, col=false, unit=2/5, alt=false, line=0.2, solid=!$preview)
    makepoly(ldraw_lib__3004(solid), step=step, col=col, unit=unit, alt=alt, line=line, solid=solid);
ldraw_lib__3004(line=0.2);
// file: ../../p/stud3.scad
use <../lib.scad>
use <4-4cyli.scad>
use <4-4disc.scad>
use <4-4edge.scad>
$fa=1; $fs=0.2;
function ldraw_lib__stud3(realsolid=false) = realsolid ? 
    [openscad(translate([0,0,-eps()], o=cylinder(4+eps(), r=4)),2)] : [
// 0 Stud Tube Solid
// 0 Name: stud3.dat
// 0 Author: James Jessiman
// 0 !LDRAW_ORG Primitive UPDATE 2012-01
// 0 !LICENSE Licensed under CC BY 2.0 and CC BY 4.0 : see CAreadme.txt
// 
// 0 BFC CERTIFY CCW
  [0,"BFC","CERTIFY"],
  [0,"BFC","CCW"],
// 
// 0 !HISTORY 2002-04-04 [sbliss] Modified for BFC compliance
// 0 !HISTORY 2002-04-25 [PTadmin] Official Update 2002-02
// 0 !HISTORY 2007-06-24 [PTadmin] Header formatted for Contributor Agreement
// 0 !HISTORY 2008-07-01 [PTadmin] Official Update 2008-01
// 0 !HISTORY 2012-02-16 [Philo] Changed to CCW
// 0 !HISTORY 2012-03-30 [PTadmin] Official Update 2012-01
// 
// 
// 1 16 0 -4 0 4 0 0 0 1 0 0 0 4 4-4edge.dat
  [1,16,0,-4,0,4,0,0,0,1,0,0,0,4, ldraw_lib__4_4edge(realsolid)],
// 1 16 0 0 0 4 0 0 0 1 0 0 0 4 4-4edge.dat
  [1,16,0,0,0,4,0,0,0,1,0,0,0,4, ldraw_lib__4_4edge(realsolid)],
// 1 16 0 -4 0 4 0 0 0 1 0 0 0 4 4-4disc.dat
  [1,16,0,-4,0,4,0,0,0,1,0,0,0,4, ldraw_lib__4_4disc(realsolid)],
// 1 16 0 -4 0 4 0 0 0 4 0 0 0 4 4-4cyli.dat
  [1,16,0,-4,0,4,0,0,0,4,0,0,0,4, ldraw_lib__4_4cyli(realsolid)],
];
module ldraw_lib__stud3(step=0, col=false, unit=2/5, alt=false, line=0.2, solid=!$preview)
    makepoly(ldraw_lib__stud3(solid), step=step, col=col, unit=unit, alt=alt, line=line, solid=solid);
ldraw_lib__stud3(line=0.2);
// file: ../../p/rect.scad
use <../lib.scad>
$fa=1; $fs=0.2;
function ldraw_lib__rect(realsolid=false) = [
// 0 Rectangle
// 0 Name: rect.dat
// 0 Author: James Jessiman
// 0 !LDRAW_ORG Primitive UPDATE 2010-01
// 0 !LICENSE Licensed under CC BY 2.0 and CC BY 4.0 : see CAreadme.txt
// 
// 0 BFC CERTIFY CCW
  [0,"BFC","CERTIFY"],
  [0,"BFC","CCW"],
// 
// 0 !HISTORY 2002-04-05 [hafhead] Added BFC statement
// 0 !HISTORY 2002-04-25 [PTadmin] Official Update 2002-02
// 0 !HISTORY 2007-06-24 [PTadmin] Header formatted for Contributor Agreement
// 0 !HISTORY 2008-07-01 [PTadmin] Official Update 2008-01
// 0 !HISTORY 2010-01-17 [mikeheide] changed winding to CCW
// 0 !HISTORY 2010-04-05 [PTadmin] Official Update 2010-01
// 
// 
// 2 24 1 0 1 -1 0 1
  [2,24,1,0,1,-1,0,1],
// 2 24 -1 0 1 -1 0 -1
  [2,24,-1,0,1,-1,0,-1],
// 2 24 -1 0 -1 1 0 -1
  [2,24,-1,0,-1,1,0,-1],
// 2 24 1 0 -1 1 0 1
  [2,24,1,0,-1,1,0,1],
// 4 16 -1 0 1 -1 0 -1 1 0 -1 1 0 1
  [4,16,-1,0,1,-1,0,-1,1,0,-1,1,0,1],
// 0
];
module ldraw_lib__rect(step=0, col=false, unit=2/5, alt=false, line=0.2, solid=!$preview)
    makepoly(ldraw_lib__rect(solid), step=step, col=col, unit=unit, alt=alt, line=line, solid=solid);
ldraw_lib__rect(line=0.2);
// file: ../../p/box4-4a.scad
use <../lib.scad>
$fa=1; $fs=0.2;
function ldraw_lib__box4_4a(realsolid=false) = [
// 0 Box with 4 Faces without 4 Adjacent Edges
// 0 Name: box4-4a.dat
// 0 Author: Manfred Moolhuysen
// 0 !LDRAW_ORG Primitive UPDATE 2012-01
// 0 !LICENSE Licensed under CC BY 2.0 and CC BY 4.0 : see CAreadme.txt
// 
// 0 BFC CERTIFY CCW
  [0,"BFC","CERTIFY"],
  [0,"BFC","CCW"],
// 
// 0 !HISTORY 1998-07-15 [PTadmin] Official Update 1998-07
// 0 !HISTORY 2002-12-13 [hafhead] Made BFC compliant
// 0 !HISTORY 2003-03-12 [PTadmin] Official Update 2003-01
// 0 !HISTORY 2007-06-24 [PTadmin] Header formatted for Contributor Agreement
// 0 !HISTORY 2008-07-01 [PTadmin] Official Update 2008-01
// 0 !HISTORY 2012-02-16 [Philo] Changed to CCW
// 0 !HISTORY 2012-03-30 [PTadmin] Official Update 2012-01
// 
// 
// 2 24 1 1 1 -1 1 1
  [2,24,1,1,1,-1,1,1],
// 2 24 -1 1 1 -1 1 -1
  [2,24,-1,1,1,-1,1,-1],
// 2 24 1 1 -1 1 1 1
  [2,24,1,1,-1,1,1,1],
// 2 24 1 0 1 -1 0 1
  [2,24,1,0,1,-1,0,1],
// 2 24 -1 0 1 -1 0 -1
  [2,24,-1,0,1,-1,0,-1],
// 2 24 1 0 -1 1 0 1
  [2,24,1,0,-1,1,0,1],
// 2 24 1 0 1 1 1 1
  [2,24,1,0,1,1,1,1],
// 2 24 -1 0 1 -1 1 1
  [2,24,-1,0,1,-1,1,1],
// 4 16 1 1 -1 -1 1 -1 -1 1 1 1 1 1
  [4,16,1,1,-1,-1,1,-1,-1,1,1,1,1,1],
// 4 16 -1 1 1 -1 0 1 1 0 1 1 1 1
  [4,16,-1,1,1,-1,0,1,1,0,1,1,1,1],
// 4 16 -1 1 -1 -1 0 -1 -1 0 1 -1 1 1
  [4,16,-1,1,-1,-1,0,-1,-1,0,1,-1,1,1],
// 4 16 1 1 1 1 0 1 1 0 -1 1 1 -1
  [4,16,1,1,1,1,0,1,1,0,-1,1,1,-1],
];
module ldraw_lib__box4_4a(step=0, col=false, unit=2/5, alt=false, line=0.2, solid=!$preview)
    makepoly(ldraw_lib__box4_4a(solid), step=step, col=col, unit=unit, alt=alt, line=line, solid=solid);
ldraw_lib__box4_4a(line=0.2);
// main file
use <../../lib.scad>
use <../../p/box4-4a.scad>
use <../../p/rect.scad>
use <../../p/stud3.scad>
$fa=1; $fs=0.2;
function ldraw_lib__s__2865s03(realsolid=false) = [
// 0 ~Train Track  9V Sleeper Side Section
// 0 Name: s\2865s03.dat
// 0 Author: Ludo Soete [ludo]
// 0 !LDRAW_ORG Subpart UPDATE 2020-03
// 0 !LICENSE Licensed under CC BY 2.0 and CC BY 4.0 : see CAreadme.txt
// 
// 0 BFC CERTIFY CCW
  [0,"BFC","CERTIFY"],
  [0,"BFC","CCW"],
// 
// 0 !HISTORY 2002-11-30 [PTadmin] Official Update 2002-05
// 0 !HISTORY 2002-12-23 [ludo] Moved studs to main part for stud-logos to be aligned correctly
// 0 !HISTORY 2004-11-06 [PTadmin] Official Update 2004-04
// 0 !HISTORY 2007-08-29 [PTadmin] Header formatted for Contributor Agreement
// 0 !HISTORY 2008-07-01 [PTadmin] Official Update 2008-01
// 0 !HISTORY 2017-11-20 [MagFors] bfc'd
// 0 !HISTORY 2020-12-29 [PTadmin] Official Update 2020-03
// 
// 
// 1 16 0 4 0 1 0 0 0 -1 0 0 0 1 stud3.dat
  [1,16,0,4,0,1,0,0,0,-1,0,0,0,1, ldraw_lib__stud3(realsolid)],
// 1 16 14 6 -10 2 0 0 0 0 -2 0 -1 0 rect.dat
  [1,16,14,6,-10,2,0,0,0,0,-2,0,-1,0, ldraw_lib__rect(realsolid)],
// 1 16 10 4 -8 2 0 0 0 4 0 0 0 2 box4-4a.dat
  [1,16,10,4,-8,2,0,0,0,4,0,0,0,2, ldraw_lib__box4_4a(realsolid)],
// 1 16 0 6 -10 8 0 0 0 0 -2 0 -1 0 rect.dat
  [1,16,0,6,-10,8,0,0,0,0,-2,0,-1,0, ldraw_lib__rect(realsolid)],
// 1 16 -10 4 -8 2 0 0 0 4 0 0 0 2 box4-4a.dat
  [1,16,-10,4,-8,2,0,0,0,4,0,0,0,2, ldraw_lib__box4_4a(realsolid)],
// 1 16 -14 6 -10 2 0 0 0 0 -2 0 -1 0 rect.dat
  [1,16,-14,6,-10,2,0,0,0,0,-2,0,-1,0, ldraw_lib__rect(realsolid)],
// 0 BFC INVERTNEXT
  [0,"BFC","INVERTNEXT"],
// 1 16 0 8 -2 16 0 0 0 -4 0 0 0 8 box4-4a.dat
  [1,16,0,8,-2,16,0,0,0,-4,0,0,0,8, ldraw_lib__box4_4a(realsolid)],
// 4 16 -20 8 10 20 8 10 16 8 6 -16 8 6
  [4,16,-20,8,10,20,8,10,16,8,6,-16,8,6],
// 4 16 16 8 -10 16 8 6 20 8 10 20 8 -10
  [4,16,16,8,-10,16,8,6,20,8,10,20,8,-10],
// 4 16 -20 8 -10 -20 8 10 -16 8 6 -16 8 -10
  [4,16,-20,8,-10,-20,8,10,-16,8,6,-16,8,-10],
// 1 16 0 8 0 20 0 0 0 -8 0 0 0 10 box4-4a.dat
  [1,16,0,8,0,20,0,0,0,-8,0,0,0,10, ldraw_lib__box4_4a(realsolid)],
];
module ldraw_lib__s__2865s03(step=0, col=false, unit=2/5, alt=false, line=0.2, solid=!$preview)
    makepoly(ldraw_lib__s__2865s03(solid), step=step, col=col, unit=unit, alt=alt, line=line, solid=solid);
ldraw_lib__s__2865s03(line=0.2);
